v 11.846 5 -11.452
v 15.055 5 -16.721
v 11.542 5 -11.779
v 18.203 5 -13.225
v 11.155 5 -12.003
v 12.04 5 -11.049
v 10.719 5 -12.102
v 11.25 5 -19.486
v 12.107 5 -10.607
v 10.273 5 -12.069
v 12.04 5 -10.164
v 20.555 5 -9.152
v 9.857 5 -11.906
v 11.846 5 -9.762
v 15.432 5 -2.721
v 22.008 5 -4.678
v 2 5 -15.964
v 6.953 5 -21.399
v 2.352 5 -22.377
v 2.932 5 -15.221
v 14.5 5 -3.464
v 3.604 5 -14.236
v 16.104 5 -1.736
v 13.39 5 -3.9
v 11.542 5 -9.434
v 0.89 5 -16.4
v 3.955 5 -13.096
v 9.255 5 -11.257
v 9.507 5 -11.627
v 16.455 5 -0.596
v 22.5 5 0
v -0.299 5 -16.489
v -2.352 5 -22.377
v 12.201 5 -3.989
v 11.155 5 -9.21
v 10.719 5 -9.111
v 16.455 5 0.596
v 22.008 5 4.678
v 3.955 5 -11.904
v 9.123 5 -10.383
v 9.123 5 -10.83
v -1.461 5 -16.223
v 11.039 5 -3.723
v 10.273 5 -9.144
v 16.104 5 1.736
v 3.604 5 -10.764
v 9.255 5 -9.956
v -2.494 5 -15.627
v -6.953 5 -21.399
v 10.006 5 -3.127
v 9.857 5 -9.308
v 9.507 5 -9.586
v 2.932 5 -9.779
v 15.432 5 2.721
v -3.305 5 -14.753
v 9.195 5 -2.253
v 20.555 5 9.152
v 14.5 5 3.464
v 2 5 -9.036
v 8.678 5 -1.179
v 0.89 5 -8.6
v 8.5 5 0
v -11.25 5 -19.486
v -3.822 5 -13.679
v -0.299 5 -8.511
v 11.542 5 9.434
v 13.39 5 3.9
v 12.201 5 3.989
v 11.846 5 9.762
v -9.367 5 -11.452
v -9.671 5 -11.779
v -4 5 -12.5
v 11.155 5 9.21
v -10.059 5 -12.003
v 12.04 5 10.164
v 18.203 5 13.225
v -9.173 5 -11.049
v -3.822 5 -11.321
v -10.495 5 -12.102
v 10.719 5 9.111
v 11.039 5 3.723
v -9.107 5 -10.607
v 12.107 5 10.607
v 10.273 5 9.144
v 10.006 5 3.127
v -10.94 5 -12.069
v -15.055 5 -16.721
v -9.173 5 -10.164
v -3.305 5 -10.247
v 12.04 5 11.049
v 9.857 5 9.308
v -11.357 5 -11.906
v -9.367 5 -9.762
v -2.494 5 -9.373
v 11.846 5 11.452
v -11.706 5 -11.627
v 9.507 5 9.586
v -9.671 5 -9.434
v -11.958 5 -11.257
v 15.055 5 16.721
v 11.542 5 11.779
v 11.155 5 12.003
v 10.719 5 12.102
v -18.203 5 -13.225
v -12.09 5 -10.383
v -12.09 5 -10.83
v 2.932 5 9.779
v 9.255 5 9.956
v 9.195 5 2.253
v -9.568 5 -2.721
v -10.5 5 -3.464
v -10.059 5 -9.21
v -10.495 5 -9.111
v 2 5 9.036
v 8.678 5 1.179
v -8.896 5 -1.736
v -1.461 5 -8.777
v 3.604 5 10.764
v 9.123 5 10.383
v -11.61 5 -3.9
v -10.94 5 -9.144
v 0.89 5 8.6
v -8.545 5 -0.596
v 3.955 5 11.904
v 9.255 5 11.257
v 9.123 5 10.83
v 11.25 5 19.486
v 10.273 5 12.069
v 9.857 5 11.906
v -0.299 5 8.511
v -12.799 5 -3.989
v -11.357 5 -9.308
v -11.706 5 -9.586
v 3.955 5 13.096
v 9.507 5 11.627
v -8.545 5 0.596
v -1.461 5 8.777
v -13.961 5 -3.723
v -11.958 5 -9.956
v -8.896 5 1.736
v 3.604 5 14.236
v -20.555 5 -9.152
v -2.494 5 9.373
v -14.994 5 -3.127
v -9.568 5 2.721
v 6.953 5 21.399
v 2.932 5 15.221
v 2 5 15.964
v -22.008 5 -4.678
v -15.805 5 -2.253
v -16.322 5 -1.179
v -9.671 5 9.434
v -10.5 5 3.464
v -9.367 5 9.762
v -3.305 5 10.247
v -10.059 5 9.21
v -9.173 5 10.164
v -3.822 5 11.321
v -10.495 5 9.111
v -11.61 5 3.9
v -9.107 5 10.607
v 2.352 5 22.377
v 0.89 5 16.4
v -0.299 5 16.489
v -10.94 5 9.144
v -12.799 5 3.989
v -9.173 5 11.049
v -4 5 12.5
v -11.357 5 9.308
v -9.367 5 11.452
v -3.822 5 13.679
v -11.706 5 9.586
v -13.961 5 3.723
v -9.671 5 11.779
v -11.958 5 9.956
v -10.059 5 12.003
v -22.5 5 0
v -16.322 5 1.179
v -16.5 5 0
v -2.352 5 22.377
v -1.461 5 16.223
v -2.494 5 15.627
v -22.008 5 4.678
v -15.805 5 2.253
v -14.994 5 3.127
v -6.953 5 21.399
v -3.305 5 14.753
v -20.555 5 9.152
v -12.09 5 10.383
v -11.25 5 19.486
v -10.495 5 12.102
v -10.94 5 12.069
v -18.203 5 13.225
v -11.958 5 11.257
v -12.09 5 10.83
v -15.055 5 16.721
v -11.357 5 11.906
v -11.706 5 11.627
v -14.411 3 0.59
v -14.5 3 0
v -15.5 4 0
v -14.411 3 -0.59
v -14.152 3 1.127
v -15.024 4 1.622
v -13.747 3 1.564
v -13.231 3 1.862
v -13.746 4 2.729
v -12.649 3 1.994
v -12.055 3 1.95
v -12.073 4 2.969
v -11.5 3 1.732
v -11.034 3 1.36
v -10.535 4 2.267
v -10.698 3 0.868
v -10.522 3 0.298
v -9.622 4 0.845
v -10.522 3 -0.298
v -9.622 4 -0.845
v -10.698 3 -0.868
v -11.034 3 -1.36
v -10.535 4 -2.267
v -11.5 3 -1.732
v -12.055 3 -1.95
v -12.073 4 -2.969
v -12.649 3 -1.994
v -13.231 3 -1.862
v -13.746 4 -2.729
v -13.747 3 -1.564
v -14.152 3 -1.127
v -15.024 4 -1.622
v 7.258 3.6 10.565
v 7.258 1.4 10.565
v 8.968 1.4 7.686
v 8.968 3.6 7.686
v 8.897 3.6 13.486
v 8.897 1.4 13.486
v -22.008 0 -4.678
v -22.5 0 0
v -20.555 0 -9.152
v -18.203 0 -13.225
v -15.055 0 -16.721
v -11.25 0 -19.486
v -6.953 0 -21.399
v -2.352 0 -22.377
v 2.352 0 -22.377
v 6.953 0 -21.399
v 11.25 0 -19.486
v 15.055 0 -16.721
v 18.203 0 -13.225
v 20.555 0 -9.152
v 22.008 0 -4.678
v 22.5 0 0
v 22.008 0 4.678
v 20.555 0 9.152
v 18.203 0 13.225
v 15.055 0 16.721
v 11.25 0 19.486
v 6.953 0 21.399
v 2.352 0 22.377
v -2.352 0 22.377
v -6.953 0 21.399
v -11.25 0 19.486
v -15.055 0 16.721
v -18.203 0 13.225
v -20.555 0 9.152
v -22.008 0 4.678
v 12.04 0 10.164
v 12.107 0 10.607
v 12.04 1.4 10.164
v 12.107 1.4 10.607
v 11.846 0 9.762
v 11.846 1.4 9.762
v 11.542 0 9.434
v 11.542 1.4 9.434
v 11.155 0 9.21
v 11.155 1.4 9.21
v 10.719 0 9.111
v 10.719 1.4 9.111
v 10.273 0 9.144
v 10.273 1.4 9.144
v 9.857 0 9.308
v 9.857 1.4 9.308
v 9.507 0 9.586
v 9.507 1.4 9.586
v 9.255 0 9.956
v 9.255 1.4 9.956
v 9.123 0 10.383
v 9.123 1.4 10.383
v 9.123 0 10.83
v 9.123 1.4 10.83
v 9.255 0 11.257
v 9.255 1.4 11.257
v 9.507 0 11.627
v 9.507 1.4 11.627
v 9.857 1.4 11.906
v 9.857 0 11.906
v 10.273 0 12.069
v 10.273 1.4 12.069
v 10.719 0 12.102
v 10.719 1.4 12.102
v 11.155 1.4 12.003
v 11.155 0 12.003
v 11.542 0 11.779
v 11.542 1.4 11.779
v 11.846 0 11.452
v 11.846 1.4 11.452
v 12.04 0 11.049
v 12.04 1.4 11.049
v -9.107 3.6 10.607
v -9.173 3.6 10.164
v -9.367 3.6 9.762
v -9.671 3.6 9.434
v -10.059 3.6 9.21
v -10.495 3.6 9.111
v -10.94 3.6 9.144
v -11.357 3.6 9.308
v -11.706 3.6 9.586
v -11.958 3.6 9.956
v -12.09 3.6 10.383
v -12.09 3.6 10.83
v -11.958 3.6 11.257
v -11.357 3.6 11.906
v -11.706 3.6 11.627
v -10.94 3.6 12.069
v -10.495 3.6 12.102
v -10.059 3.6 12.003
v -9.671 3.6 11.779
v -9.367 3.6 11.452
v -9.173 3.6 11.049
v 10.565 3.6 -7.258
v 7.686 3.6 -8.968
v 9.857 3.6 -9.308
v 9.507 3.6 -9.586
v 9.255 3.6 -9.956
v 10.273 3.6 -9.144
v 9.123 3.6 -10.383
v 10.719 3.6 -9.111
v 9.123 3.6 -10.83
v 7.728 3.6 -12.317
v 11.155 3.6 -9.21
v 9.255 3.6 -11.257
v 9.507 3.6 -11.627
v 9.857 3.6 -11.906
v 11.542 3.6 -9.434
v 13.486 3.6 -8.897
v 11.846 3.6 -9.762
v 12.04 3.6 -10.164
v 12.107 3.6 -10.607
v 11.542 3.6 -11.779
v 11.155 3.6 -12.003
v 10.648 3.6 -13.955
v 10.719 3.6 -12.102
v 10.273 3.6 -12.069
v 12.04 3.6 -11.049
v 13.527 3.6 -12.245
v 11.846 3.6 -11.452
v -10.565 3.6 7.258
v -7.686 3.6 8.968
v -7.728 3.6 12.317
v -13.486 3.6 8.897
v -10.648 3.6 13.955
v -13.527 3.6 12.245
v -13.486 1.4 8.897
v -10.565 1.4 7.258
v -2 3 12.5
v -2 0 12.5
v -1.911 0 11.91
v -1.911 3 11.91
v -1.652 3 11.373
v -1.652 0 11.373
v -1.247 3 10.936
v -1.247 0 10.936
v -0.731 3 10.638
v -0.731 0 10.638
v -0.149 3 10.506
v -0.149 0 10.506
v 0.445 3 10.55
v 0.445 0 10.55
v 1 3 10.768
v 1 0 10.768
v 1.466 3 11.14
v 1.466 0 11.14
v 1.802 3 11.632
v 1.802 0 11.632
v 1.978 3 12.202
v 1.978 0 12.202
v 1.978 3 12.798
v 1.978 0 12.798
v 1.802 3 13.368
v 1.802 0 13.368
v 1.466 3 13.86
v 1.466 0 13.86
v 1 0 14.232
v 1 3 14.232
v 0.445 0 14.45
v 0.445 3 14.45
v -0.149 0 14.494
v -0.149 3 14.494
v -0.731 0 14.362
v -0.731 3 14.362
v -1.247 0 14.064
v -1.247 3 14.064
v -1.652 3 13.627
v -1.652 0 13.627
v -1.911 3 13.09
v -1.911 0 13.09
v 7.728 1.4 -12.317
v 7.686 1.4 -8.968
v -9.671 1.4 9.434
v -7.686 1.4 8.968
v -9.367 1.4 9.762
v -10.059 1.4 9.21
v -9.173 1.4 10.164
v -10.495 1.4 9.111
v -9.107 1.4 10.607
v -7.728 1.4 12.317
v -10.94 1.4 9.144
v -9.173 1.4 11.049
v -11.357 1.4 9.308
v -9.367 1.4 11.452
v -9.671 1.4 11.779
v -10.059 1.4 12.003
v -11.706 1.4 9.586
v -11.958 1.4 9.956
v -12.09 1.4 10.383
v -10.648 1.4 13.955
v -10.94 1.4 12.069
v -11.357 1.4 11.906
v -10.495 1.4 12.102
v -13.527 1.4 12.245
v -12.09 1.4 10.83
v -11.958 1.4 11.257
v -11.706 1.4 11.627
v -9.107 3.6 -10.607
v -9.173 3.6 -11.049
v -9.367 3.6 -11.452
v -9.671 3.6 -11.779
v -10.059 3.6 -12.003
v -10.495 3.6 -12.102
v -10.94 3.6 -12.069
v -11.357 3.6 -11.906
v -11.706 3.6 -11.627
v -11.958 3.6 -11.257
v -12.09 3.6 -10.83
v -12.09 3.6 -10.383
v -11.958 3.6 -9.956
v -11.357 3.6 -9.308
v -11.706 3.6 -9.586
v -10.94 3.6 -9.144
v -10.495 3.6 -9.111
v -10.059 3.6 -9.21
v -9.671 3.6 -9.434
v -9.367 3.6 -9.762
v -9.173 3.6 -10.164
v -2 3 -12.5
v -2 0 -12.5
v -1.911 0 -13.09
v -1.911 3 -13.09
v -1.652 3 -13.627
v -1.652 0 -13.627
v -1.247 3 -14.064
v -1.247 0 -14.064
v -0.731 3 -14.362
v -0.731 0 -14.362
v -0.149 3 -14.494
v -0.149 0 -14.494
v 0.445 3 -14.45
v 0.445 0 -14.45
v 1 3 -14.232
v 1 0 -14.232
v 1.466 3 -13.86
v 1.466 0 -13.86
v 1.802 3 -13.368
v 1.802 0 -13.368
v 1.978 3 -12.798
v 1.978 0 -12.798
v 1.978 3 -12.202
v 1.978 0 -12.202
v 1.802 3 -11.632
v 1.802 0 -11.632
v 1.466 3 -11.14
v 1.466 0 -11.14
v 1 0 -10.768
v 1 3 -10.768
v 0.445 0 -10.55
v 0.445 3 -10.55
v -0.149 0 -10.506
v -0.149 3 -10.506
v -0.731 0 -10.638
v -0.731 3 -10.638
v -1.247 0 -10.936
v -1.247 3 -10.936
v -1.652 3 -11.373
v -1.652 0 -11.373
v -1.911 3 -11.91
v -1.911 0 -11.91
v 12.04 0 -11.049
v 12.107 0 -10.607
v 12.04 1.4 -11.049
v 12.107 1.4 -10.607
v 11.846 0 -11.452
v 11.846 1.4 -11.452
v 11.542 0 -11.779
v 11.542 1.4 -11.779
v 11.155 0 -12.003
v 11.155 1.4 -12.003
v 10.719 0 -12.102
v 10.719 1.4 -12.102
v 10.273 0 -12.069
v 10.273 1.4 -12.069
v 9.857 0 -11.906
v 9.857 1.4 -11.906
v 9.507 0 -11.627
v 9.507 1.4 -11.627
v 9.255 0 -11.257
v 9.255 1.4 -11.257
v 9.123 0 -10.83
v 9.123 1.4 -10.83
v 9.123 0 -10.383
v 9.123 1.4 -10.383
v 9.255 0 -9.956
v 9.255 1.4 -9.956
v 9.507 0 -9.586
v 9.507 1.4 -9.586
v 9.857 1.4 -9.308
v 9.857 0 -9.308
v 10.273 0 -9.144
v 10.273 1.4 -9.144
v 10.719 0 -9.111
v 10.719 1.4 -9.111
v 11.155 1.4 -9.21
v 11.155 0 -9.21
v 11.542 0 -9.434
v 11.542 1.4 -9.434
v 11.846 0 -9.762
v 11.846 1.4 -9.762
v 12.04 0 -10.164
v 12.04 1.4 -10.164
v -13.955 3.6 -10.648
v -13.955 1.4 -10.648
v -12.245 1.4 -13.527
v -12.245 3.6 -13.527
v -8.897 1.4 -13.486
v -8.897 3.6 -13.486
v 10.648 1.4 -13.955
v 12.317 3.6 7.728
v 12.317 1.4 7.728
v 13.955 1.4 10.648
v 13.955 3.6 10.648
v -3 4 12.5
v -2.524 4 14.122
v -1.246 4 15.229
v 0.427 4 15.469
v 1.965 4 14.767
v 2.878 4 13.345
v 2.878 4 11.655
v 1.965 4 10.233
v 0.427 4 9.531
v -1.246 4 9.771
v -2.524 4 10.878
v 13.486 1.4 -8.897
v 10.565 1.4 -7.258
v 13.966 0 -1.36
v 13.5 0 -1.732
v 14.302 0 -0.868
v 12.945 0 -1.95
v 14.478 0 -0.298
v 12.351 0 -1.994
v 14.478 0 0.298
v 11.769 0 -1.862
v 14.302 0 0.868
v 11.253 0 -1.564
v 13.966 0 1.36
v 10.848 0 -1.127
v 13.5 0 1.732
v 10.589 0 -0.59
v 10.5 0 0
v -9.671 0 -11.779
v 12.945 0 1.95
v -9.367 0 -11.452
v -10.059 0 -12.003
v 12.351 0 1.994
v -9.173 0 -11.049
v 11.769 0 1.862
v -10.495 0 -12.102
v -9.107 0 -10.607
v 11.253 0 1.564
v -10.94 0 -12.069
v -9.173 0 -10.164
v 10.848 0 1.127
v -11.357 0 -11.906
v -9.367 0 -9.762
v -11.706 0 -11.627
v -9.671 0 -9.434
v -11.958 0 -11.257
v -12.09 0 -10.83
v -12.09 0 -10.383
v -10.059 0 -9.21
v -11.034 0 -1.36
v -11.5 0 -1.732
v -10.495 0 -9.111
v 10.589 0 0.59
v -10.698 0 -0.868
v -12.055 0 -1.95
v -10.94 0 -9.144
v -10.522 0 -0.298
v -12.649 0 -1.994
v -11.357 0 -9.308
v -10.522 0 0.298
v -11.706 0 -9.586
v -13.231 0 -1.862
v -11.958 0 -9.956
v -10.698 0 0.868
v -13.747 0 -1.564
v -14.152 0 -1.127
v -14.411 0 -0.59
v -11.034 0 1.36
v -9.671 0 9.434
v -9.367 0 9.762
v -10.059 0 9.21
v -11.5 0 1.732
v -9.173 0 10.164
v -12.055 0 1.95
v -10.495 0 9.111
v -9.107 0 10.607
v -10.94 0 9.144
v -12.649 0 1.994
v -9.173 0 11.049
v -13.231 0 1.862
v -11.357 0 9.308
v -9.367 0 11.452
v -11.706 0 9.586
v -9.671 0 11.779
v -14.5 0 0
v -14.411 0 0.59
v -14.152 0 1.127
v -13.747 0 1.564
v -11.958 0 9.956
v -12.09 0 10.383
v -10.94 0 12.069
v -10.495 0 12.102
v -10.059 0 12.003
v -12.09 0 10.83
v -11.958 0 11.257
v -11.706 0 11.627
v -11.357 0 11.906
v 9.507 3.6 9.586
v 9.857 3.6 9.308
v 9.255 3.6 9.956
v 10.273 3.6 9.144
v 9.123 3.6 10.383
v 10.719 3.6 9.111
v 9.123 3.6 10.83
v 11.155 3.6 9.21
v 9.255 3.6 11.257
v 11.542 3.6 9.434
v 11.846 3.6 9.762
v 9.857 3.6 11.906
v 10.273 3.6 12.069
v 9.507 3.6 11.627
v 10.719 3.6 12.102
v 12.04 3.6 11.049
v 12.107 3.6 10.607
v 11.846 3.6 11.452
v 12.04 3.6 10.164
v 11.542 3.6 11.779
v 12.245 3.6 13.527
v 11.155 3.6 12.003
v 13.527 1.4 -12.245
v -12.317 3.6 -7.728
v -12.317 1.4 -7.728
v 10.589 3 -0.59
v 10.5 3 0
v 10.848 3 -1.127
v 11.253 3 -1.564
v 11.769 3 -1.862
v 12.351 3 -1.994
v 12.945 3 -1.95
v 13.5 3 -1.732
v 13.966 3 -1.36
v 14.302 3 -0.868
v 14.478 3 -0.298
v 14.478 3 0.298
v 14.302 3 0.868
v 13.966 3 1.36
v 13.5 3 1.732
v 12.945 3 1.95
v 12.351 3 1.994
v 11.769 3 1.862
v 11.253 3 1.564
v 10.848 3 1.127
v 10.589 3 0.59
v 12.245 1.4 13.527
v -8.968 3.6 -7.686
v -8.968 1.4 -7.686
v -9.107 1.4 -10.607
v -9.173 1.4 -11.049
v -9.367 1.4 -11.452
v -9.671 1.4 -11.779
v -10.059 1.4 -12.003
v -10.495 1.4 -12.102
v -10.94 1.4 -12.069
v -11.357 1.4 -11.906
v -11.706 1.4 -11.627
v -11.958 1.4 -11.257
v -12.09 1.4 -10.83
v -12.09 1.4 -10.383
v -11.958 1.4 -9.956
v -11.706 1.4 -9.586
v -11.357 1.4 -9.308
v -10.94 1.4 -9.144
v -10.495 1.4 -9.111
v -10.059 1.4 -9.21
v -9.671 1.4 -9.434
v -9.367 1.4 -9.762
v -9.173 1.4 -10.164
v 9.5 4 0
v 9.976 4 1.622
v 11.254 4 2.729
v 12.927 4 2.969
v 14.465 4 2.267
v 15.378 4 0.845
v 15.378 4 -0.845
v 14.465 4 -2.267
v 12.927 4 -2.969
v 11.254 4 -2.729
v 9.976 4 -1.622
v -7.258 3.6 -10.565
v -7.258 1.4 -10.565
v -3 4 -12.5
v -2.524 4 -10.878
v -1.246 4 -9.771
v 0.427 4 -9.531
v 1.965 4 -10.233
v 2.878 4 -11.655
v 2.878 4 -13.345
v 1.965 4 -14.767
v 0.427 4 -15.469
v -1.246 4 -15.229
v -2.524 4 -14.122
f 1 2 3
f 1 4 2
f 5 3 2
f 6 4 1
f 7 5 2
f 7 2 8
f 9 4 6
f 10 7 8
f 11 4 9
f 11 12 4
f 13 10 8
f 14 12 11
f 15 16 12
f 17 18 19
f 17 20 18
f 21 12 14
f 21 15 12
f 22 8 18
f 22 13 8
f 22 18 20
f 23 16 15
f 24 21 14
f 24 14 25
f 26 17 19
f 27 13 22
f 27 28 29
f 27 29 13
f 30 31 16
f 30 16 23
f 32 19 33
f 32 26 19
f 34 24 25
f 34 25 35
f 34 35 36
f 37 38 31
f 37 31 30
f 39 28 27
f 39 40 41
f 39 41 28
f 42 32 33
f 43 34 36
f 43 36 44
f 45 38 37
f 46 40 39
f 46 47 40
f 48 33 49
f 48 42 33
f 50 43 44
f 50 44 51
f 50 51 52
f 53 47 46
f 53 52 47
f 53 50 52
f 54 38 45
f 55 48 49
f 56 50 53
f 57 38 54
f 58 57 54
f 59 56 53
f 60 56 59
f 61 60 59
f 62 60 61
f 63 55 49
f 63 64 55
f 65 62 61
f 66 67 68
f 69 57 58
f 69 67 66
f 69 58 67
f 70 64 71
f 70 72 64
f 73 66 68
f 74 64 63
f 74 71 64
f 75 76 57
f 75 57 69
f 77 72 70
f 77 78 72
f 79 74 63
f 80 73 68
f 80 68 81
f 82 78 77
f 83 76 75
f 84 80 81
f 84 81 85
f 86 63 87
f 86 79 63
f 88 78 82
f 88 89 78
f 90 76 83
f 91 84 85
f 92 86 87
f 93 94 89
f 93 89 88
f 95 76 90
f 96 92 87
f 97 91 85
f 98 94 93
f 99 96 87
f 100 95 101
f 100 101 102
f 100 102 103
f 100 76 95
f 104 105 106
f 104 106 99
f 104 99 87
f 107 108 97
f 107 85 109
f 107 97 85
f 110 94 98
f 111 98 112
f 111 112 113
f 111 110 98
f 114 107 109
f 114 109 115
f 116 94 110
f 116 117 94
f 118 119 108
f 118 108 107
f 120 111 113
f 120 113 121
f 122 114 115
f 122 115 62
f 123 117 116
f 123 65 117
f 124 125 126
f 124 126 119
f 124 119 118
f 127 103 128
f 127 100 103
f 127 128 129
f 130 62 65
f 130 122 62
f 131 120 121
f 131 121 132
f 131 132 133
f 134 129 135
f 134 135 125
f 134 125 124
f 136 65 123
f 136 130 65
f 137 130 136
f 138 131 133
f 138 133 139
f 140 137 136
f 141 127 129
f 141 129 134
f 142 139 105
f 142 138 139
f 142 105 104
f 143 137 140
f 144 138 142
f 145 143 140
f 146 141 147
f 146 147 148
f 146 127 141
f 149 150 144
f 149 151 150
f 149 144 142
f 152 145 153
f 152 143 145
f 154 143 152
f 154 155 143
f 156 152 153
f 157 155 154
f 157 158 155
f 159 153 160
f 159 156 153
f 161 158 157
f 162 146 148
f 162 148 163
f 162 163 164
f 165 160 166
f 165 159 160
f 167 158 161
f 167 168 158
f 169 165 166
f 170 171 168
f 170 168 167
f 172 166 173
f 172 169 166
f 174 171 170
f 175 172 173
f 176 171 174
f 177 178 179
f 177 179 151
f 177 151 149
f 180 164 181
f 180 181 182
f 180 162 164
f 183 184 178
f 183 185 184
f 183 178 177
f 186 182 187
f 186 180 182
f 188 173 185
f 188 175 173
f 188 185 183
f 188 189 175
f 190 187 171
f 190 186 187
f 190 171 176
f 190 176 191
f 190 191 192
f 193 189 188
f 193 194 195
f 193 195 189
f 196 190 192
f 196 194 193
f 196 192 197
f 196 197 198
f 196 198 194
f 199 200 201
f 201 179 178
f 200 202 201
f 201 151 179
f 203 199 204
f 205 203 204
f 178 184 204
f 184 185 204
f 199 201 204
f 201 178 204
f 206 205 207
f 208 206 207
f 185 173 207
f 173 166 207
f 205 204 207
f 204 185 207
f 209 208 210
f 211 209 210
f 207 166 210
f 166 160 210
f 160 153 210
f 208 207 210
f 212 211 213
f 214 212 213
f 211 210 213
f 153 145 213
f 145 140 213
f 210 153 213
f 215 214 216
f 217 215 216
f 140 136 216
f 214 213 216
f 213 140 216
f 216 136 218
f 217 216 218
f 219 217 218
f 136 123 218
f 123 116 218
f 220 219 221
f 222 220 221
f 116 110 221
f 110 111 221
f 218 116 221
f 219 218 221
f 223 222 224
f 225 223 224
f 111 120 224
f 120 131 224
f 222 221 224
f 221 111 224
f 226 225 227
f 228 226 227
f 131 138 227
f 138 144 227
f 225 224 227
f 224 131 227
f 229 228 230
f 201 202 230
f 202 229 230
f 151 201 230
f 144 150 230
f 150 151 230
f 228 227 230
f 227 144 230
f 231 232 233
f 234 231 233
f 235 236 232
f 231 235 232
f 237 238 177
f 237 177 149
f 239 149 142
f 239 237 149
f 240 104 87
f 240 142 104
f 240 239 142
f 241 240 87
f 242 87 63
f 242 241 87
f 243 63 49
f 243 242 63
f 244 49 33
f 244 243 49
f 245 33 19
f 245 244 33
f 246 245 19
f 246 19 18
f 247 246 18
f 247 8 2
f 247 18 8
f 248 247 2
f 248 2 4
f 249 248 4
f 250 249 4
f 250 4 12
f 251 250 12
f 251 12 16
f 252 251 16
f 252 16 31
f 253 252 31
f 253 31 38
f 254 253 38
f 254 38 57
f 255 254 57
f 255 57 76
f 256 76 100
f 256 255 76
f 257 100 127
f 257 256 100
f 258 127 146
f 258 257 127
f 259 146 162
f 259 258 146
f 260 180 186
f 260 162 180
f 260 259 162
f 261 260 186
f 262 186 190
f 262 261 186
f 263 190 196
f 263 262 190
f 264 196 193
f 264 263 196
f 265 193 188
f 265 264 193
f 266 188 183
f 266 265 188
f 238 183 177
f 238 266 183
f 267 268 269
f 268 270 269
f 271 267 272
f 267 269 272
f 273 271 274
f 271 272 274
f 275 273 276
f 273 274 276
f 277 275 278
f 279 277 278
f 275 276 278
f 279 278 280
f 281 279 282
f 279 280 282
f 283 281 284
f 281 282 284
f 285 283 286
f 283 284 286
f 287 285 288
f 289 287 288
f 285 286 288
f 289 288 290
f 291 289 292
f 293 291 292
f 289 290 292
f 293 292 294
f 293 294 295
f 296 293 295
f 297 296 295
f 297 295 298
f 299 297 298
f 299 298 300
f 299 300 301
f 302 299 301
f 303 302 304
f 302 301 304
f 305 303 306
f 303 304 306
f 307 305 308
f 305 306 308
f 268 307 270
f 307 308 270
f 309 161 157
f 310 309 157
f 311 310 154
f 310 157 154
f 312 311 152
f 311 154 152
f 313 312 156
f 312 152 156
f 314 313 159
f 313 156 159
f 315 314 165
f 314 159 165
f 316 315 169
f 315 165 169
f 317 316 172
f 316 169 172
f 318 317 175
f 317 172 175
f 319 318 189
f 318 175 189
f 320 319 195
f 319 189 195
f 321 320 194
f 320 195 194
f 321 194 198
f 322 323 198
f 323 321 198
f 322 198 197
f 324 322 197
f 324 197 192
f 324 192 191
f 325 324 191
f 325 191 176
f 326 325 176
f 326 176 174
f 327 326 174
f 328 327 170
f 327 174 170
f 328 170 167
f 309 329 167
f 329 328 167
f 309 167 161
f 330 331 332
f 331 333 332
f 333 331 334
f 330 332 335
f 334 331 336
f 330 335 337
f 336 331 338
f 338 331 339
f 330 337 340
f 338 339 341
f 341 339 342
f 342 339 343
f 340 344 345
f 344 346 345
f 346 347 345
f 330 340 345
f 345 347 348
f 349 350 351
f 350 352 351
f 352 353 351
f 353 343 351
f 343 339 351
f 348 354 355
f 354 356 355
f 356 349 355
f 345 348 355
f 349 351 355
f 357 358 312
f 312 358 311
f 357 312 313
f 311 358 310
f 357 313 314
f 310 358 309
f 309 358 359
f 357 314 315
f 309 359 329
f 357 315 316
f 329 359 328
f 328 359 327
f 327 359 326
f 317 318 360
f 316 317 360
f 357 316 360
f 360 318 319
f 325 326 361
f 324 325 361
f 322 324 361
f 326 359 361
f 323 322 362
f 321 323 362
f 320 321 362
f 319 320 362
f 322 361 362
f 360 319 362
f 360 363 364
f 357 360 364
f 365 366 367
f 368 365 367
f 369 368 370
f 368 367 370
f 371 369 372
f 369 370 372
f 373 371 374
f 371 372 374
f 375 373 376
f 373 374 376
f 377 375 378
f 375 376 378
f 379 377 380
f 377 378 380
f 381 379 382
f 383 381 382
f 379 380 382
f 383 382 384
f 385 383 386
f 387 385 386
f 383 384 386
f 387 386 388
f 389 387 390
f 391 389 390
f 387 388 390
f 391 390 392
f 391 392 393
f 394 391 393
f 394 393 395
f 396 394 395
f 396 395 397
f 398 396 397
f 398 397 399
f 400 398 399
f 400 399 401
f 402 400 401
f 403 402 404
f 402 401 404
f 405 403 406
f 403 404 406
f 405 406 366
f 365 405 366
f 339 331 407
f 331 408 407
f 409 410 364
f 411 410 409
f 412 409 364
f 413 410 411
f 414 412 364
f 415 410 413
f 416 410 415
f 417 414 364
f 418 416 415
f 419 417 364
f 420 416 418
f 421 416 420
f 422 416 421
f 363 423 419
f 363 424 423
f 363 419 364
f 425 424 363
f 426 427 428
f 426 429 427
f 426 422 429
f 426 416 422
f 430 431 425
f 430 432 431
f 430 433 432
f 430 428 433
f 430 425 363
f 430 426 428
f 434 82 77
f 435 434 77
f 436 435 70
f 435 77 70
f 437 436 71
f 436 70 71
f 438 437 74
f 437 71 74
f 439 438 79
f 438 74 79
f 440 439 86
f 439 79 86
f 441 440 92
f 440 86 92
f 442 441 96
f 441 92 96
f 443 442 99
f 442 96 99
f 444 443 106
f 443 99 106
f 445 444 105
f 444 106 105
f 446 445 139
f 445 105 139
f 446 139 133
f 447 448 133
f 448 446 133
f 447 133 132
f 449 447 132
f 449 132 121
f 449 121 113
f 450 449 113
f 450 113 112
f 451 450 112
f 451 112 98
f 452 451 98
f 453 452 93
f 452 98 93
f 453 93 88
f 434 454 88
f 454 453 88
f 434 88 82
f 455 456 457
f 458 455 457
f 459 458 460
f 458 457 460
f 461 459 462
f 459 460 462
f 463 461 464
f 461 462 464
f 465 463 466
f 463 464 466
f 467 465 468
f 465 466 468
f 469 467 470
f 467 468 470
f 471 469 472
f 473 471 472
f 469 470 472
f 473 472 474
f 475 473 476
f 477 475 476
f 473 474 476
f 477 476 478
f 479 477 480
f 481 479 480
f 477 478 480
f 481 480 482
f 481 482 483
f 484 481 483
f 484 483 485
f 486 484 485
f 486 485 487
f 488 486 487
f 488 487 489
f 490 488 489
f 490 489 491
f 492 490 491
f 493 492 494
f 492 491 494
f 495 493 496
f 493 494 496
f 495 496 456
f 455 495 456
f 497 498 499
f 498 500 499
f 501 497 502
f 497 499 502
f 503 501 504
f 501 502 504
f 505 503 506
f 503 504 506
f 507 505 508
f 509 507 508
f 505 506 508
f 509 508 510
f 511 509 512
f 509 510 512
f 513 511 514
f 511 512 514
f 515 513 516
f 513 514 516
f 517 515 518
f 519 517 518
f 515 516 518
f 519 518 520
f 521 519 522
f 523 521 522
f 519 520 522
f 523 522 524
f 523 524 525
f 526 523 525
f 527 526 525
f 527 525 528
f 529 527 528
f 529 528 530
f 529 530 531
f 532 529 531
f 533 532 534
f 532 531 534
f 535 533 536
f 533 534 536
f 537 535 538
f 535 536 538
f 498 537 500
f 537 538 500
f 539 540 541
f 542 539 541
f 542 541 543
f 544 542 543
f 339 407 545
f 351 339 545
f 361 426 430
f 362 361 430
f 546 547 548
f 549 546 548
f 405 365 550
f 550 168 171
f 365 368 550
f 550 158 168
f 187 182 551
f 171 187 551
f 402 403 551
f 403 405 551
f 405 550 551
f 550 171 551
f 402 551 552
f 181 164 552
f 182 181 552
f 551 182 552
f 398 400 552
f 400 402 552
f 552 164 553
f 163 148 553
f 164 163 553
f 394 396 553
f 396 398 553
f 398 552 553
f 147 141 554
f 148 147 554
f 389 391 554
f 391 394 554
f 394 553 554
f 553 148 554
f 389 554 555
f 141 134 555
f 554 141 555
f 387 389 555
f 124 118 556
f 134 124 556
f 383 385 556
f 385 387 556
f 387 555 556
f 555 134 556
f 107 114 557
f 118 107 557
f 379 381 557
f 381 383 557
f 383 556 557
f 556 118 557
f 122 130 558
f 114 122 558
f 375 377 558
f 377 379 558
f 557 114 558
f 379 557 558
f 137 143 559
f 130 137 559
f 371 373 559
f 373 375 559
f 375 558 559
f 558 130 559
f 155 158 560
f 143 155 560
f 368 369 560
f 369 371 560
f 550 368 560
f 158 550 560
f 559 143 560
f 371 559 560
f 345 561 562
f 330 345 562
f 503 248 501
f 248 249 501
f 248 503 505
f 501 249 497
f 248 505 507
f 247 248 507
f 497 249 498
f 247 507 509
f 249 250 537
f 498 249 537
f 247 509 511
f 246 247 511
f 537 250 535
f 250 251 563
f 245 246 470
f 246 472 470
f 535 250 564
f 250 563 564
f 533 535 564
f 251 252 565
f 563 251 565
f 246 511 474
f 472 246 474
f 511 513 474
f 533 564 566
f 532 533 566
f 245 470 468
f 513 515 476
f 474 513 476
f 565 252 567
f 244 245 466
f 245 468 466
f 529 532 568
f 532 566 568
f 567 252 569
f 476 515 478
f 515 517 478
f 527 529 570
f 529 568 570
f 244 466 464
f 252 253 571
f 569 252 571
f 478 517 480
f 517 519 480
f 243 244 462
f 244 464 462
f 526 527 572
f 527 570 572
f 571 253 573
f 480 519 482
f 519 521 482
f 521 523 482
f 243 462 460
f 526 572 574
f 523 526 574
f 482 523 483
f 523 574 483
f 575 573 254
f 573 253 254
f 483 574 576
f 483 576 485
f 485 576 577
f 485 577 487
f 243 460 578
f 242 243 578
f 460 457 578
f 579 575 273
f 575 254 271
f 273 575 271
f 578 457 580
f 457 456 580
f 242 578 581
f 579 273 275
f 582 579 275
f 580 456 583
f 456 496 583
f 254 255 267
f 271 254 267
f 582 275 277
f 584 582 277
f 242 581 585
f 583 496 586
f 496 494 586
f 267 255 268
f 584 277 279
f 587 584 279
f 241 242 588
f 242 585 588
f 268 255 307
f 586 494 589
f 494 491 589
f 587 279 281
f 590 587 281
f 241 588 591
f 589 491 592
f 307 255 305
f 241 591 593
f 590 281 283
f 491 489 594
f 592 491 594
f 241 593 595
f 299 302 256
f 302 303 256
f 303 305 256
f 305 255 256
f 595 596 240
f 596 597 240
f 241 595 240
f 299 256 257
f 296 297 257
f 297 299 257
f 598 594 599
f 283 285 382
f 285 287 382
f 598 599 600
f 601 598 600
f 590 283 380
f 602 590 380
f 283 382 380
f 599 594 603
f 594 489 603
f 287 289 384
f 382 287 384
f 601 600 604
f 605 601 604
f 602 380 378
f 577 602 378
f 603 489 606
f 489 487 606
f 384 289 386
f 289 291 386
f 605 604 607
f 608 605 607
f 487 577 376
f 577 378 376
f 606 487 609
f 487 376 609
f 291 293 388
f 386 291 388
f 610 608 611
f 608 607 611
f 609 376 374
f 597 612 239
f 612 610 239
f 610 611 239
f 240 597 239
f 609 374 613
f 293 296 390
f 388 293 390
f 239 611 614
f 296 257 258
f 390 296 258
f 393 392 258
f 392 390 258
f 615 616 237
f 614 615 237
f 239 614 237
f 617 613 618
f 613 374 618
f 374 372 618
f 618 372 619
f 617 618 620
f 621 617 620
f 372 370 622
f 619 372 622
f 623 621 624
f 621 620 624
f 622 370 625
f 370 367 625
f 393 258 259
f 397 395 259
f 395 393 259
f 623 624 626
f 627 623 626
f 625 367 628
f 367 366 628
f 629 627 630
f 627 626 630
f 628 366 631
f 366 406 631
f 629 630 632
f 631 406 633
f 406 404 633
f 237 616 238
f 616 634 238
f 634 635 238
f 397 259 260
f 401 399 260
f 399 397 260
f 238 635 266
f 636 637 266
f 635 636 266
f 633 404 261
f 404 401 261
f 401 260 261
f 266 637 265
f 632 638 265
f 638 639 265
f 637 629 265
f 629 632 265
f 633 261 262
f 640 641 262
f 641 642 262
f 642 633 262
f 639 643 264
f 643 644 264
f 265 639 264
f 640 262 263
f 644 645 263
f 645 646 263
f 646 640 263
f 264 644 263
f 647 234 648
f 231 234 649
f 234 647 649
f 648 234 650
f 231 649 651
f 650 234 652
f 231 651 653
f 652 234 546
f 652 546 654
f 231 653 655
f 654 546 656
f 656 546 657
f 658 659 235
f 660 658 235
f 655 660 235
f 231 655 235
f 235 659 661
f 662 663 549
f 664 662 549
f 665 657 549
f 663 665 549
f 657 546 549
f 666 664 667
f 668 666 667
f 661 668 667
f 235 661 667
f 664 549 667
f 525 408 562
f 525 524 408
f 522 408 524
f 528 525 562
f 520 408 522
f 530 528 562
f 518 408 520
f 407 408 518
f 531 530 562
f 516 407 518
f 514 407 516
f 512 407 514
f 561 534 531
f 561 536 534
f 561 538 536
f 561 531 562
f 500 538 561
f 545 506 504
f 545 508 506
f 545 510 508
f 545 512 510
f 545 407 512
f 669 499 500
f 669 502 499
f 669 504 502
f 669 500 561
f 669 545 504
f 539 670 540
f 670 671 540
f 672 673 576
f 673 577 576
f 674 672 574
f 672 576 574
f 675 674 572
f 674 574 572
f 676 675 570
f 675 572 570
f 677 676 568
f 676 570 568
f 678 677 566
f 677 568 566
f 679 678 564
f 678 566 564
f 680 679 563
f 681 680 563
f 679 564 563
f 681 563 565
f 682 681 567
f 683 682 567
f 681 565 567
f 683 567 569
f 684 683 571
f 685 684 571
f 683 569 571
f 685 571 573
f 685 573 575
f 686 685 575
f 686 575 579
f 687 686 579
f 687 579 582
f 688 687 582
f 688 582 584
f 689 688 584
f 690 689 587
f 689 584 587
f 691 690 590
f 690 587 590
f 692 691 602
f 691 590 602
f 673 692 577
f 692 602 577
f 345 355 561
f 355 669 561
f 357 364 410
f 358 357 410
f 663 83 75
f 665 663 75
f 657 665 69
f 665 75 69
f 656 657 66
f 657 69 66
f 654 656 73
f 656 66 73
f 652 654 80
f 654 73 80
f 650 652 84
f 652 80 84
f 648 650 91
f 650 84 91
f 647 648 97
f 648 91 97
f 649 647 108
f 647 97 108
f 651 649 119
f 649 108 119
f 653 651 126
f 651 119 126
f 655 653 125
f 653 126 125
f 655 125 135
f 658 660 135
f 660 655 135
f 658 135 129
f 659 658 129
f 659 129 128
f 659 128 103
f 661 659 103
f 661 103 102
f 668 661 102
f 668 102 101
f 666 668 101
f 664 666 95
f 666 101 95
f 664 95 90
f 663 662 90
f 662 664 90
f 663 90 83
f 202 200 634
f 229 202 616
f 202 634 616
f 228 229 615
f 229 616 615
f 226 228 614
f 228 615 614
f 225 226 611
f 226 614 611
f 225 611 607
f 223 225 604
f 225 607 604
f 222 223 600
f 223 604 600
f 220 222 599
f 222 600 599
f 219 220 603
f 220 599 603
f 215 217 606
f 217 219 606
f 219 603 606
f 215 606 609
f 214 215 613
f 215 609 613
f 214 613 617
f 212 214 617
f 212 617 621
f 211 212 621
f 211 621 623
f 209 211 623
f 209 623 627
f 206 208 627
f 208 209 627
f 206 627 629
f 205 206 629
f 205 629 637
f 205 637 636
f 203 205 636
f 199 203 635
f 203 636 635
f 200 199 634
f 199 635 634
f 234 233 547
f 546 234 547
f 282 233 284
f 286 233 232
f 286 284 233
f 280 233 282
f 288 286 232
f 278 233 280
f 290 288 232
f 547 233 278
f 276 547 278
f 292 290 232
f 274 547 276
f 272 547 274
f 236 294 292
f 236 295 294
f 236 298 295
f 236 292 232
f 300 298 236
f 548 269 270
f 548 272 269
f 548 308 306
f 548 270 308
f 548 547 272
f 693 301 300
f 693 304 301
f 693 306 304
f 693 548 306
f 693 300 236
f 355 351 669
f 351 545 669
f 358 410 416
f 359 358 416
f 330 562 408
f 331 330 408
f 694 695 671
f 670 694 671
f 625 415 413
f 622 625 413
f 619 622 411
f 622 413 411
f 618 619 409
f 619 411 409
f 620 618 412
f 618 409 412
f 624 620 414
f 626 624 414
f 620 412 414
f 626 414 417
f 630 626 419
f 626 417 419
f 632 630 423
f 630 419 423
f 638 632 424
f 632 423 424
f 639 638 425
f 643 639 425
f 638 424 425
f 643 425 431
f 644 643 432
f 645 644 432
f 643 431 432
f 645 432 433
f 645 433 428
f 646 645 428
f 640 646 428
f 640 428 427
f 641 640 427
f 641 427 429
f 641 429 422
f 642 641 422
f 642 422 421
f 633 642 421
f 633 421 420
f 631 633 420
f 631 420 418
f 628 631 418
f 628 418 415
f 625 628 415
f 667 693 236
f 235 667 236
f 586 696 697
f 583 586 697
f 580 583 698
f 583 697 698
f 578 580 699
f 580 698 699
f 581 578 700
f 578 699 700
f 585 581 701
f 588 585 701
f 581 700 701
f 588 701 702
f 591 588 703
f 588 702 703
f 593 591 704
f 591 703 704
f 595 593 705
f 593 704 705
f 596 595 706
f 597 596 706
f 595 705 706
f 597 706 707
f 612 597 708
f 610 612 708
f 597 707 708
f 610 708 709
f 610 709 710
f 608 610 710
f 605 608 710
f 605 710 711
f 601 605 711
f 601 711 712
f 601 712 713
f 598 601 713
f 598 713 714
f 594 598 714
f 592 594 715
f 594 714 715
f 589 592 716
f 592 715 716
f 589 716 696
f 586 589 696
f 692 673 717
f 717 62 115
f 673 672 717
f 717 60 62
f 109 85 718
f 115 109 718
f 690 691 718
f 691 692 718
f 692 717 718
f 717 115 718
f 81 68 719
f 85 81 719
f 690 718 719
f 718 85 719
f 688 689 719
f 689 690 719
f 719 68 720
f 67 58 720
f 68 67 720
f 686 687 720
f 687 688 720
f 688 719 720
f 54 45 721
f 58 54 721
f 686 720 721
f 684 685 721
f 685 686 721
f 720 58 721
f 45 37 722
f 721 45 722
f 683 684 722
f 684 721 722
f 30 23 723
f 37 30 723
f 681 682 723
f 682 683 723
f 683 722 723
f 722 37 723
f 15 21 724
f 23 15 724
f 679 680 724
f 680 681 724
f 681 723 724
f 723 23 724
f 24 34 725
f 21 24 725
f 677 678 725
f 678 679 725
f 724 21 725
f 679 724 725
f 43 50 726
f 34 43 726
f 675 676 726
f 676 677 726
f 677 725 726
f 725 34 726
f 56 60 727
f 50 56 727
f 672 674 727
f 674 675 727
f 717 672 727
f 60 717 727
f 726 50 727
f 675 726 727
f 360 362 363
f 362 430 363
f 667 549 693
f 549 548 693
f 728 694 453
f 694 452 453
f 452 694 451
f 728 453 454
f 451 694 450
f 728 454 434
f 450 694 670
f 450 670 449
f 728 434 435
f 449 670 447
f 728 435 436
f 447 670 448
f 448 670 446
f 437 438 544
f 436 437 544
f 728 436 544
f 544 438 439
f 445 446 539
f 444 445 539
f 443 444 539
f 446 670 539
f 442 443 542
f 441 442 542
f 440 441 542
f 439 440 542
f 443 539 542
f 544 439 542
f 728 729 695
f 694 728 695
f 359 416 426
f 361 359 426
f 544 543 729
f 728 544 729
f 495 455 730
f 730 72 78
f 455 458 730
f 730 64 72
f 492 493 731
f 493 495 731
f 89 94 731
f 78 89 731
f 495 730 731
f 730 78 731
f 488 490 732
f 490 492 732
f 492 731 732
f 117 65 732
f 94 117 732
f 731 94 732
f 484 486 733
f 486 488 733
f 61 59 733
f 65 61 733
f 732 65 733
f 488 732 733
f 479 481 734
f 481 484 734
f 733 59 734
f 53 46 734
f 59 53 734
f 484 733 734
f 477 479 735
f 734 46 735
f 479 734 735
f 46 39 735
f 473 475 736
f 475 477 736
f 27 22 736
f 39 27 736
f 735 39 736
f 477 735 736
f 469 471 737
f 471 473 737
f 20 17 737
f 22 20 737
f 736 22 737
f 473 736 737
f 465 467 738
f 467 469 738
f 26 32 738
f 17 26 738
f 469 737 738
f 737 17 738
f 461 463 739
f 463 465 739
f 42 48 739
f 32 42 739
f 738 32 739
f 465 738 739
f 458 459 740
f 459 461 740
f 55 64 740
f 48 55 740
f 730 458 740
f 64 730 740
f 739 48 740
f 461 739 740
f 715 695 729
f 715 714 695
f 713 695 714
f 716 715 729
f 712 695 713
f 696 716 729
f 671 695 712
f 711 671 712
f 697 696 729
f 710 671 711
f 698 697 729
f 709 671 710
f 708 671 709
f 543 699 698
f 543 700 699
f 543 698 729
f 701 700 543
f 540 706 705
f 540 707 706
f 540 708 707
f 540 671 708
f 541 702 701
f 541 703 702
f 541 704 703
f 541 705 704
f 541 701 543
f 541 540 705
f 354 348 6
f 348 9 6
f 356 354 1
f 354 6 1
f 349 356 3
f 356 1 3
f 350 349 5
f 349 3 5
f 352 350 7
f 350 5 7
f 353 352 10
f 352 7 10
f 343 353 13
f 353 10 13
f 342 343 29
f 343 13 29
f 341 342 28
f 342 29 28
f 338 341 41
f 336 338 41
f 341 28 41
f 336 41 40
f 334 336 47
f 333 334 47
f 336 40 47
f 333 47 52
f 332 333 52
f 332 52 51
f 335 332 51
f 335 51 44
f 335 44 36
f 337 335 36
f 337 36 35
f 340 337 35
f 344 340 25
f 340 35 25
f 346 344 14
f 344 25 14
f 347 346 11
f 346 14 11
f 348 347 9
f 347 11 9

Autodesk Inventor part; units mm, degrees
ref_plane "YZ Plane" through (0, 0, 0) normal (1, 0, 0) x (0, 1, 0)
ref_plane "XZ Plane" through (0, 0, 0) normal (0, 1, 0) x (-1, 0, 0)
sketch "Sketch1" plane through (0, 0, 0) normal (0, 1, 0) x (-1, 0, 0)
  circle A0 centre (0, 0) radius 12.5
  circle A1 centre (12.5, 0) radius 2
  circle A2 centre (0, 12.5) radius 2
  circle A3 centre (-12.5, 0) radius 2
  circle A4 centre (0, -12.5) radius 2
  circle A5 centre (0, 0) radius 22.5
  dimension "d0" = 25
  dimension "d1" = 4
  dimension "d4" = 360
  dimension "d6" = 45
extrude "Extrusion1" add sketch "Sketch1" along normal blind 5 contours A1 A0 A4 A3 A2 | A5
chamfer "Chamfer1" distance 2 angle 45 4 edges at (-10.5, 5, 0) (2, 5, 12.5) (14.5, 5, 0) (2, 5, -12.5)
sketch "Sketch2" plane through (0, 5, 0) normal (0, 1, 0) x (1, 0, 0)
  circle A0 centre (0, 0) radius 15
  line L0 (0, 0) -> (-15, 0)
  line L1 (0, 0) -> (-10.6066, -10.6066)
  circle A1 centre (-10.6066, -10.6066) radius 1.5
  circle A2 centre (10.6066, -10.6066) radius 1.5
  circle A3 centre (10.6066, 10.6066) radius 1.5
  circle A4 centre (-10.6066, 10.6066) radius 1.5
  dimension "d12" = 30
  dimension "d13" = 45
  dimension "d14" = 3
  dimension "d17" = 360
extrude "Extrusion2" cut sketch "Sketch2" against normal blind 5 contours A3 A0 | A0 A3 | A2 A0 | A0 A2 | A4 A0 | A0 A4 | A1 A0 | A0 L1 A1 | A0 A1 L1
ref_plane "Work Plane1" through (0, 2.5, 0) normal (0, 1, 0) x (1, 0, 0)
sketch "Sketch4" plane through (0, 2.5, 0) normal (0, 1, 0) x (1, 0, 0)
  circle A0 centre (10.6066, 10.6066) radius 1.5 projected
  circle A1 centre (10.6066, -10.6066) radius 1.5 projected
  circle A2 centre (-10.6066, -10.6066) radius 1.5 projected
  circle A3 centre (-10.6066, 10.6066) radius 1.5 projected
  line L0 (13.4857, 8.8966) -> (10.5653, 7.2582)
  line L1 (10.5653, 7.2582) -> (7.6862, 8.9682)
  line L2 (7.6862, 8.9682) -> (7.7275, 12.3166)
  line L3 (7.7275, 12.3166) -> (10.6479, 13.955)
  line L4 (10.6479, 13.955) -> (13.527, 12.245)
  line L5 (13.527, 12.245) -> (13.4857, 8.8966)
  point P0 (0, 0)
  dimension "d28" = 5.8
extrude "Extrusion3" cut sketch "Sketch4" along normal mid plane 2.2 contours L0 L1 L2 L3 L4 L5
pattern_circular "Circular Pattern1" count 4 over 360 about axis through (0, 0, 0) along (0, 1, 0) of "Extrusion3"
properties part number "adaptador"
